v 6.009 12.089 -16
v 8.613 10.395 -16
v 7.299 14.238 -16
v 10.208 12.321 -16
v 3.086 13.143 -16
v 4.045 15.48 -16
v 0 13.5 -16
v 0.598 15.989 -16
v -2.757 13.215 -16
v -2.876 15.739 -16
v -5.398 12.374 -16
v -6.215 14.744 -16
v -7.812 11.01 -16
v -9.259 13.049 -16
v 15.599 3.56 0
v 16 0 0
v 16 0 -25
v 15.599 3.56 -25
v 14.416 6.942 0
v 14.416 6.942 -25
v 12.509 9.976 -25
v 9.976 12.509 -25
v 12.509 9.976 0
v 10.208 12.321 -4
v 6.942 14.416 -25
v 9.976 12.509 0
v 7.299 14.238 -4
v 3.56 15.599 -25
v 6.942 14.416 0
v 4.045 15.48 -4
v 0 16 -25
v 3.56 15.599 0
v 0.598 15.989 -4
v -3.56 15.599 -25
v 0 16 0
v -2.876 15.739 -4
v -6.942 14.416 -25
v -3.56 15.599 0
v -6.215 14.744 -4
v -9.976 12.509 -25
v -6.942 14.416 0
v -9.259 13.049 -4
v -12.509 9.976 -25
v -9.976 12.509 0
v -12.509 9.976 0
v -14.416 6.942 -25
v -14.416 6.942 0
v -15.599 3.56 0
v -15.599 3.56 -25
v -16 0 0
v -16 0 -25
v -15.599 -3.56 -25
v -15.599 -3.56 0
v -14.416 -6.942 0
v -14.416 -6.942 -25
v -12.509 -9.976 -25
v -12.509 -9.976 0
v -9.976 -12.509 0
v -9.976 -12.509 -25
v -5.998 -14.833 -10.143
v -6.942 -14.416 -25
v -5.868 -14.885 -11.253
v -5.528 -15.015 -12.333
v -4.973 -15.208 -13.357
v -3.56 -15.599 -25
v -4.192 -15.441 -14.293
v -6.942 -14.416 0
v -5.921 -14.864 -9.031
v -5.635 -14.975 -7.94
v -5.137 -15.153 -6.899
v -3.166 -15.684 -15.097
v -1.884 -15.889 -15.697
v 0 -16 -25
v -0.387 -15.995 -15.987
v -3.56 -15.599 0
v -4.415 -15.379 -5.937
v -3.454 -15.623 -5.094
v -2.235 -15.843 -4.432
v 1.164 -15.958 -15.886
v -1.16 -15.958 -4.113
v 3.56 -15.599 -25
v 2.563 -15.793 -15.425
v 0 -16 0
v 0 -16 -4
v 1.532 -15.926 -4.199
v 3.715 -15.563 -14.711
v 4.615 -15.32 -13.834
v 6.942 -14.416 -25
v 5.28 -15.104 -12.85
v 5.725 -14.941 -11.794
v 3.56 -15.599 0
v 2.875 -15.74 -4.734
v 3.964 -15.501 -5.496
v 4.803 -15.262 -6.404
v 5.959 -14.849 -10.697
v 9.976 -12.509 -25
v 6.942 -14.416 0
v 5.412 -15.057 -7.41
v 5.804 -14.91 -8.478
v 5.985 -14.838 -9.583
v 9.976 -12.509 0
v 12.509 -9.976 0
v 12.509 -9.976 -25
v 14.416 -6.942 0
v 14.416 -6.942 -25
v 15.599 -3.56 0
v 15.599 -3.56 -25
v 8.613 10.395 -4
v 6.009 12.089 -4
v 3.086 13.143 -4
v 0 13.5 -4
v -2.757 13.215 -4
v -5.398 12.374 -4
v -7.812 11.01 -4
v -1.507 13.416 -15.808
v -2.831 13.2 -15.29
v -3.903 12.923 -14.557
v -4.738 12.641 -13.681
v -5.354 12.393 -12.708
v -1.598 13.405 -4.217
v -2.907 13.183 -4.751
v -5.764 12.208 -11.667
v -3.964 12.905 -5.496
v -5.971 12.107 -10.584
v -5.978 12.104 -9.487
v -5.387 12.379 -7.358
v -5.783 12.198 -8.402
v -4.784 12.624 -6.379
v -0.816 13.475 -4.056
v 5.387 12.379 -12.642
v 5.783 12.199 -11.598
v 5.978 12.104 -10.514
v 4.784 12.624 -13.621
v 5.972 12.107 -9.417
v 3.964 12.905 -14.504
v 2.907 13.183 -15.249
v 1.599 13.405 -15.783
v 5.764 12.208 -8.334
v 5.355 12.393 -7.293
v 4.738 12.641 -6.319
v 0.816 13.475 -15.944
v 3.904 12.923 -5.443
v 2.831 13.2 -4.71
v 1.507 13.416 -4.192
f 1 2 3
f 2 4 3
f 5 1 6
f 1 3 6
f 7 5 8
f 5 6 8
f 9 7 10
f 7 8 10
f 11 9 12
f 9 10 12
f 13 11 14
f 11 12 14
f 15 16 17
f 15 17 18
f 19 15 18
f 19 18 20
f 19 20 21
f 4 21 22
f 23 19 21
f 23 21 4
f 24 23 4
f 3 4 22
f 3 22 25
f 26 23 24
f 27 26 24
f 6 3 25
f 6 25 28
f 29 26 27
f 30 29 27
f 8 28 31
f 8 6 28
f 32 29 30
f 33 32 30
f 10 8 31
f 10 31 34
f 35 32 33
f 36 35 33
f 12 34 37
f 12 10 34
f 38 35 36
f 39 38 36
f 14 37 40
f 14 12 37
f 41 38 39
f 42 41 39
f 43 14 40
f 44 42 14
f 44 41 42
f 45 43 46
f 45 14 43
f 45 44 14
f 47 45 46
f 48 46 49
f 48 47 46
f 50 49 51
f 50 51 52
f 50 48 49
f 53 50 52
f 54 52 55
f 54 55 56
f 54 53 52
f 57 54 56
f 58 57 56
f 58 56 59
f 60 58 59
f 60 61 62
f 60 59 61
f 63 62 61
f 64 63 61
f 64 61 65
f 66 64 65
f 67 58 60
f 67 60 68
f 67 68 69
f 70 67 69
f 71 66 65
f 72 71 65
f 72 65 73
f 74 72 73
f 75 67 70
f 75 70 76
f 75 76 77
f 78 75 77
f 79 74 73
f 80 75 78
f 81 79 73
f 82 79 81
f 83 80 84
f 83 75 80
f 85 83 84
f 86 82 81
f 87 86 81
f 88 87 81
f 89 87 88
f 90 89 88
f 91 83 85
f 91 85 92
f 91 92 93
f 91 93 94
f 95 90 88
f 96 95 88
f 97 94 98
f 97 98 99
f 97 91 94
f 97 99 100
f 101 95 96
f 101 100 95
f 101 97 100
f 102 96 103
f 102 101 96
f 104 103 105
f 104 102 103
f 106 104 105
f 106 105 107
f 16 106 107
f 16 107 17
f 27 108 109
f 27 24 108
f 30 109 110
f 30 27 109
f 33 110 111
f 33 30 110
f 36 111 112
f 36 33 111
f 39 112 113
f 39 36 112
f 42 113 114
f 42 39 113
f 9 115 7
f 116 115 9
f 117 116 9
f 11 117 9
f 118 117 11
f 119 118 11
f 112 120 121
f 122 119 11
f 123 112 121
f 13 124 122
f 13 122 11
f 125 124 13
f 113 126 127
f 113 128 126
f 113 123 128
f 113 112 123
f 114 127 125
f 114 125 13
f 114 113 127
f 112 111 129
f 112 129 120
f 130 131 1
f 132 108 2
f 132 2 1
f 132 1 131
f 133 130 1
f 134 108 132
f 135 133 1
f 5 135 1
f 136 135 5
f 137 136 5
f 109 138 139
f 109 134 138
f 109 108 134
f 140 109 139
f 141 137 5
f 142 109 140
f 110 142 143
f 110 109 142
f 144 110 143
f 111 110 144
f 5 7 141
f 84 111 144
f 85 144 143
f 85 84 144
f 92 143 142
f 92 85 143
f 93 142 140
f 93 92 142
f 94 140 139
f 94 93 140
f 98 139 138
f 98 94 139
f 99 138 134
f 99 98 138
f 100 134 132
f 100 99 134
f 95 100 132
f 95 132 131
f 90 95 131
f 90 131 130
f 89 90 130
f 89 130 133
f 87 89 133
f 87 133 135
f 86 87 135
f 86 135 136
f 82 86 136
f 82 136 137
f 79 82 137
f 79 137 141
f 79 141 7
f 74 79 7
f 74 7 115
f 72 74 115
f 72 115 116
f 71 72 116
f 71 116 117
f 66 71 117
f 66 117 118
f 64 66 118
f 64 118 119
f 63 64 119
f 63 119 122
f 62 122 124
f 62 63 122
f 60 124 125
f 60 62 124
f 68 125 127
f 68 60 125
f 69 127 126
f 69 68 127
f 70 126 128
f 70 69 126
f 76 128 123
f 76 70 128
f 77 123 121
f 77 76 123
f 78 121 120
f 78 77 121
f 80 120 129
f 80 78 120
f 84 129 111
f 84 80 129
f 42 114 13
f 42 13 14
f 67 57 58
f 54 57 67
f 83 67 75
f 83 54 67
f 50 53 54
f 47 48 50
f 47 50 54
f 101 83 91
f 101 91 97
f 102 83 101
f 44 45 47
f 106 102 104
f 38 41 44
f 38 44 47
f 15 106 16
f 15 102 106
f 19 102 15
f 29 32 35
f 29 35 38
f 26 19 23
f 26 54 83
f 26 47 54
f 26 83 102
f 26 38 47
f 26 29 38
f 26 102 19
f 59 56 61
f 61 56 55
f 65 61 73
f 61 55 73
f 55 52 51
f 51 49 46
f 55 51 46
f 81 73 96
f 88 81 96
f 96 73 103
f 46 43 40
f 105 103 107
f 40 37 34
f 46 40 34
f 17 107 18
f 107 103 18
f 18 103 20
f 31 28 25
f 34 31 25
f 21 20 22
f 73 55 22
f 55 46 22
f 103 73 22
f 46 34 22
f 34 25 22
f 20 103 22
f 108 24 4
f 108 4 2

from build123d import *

# Parameters (mm, degrees)
SKETCH1_R               = 16
BOSS_EXTRUDE1_DEPTH     = 25
CUT_EXTRUDE1_DEPTH      = 34.7194306
CUT_EXTRUDE1_DEPTH_BACK = 34.7194306
SKETCH2_R               = 6
CUT_EXTRUDE2_START      = -4
CUT_EXTRUDE2_DEPTH      = 12


with BuildPart() as part:
    # Sketch1 → Boss-Extrude1 (new body)
    with BuildSketch(Plane.XY):
        Circle(SKETCH1_R)
    extrude(amount=-BOSS_EXTRUDE1_DEPTH)

    # Sketch2 → Cut-Extrude1 (cut, two sides: drawn at the far end of the back side and taken through both)
    with BuildSketch(Plane(origin=(0, 0, 0), x_dir=(1, 0, 0), z_dir=(0, 1, 0)).offset(-CUT_EXTRUDE1_DEPTH_BACK)):
        with Locations(Location((0, 10, 0), (0, 0, 270))):
            Circle(SKETCH2_R)
    extrude(amount=CUT_EXTRUDE1_DEPTH + CUT_EXTRUDE1_DEPTH_BACK, mode=Mode.SUBTRACT)

    # Sketch3 → Cut-Extrude2 (cut)
    with BuildSketch(Plane.XY.offset(CUT_EXTRUDE2_START)):
        with BuildLine():
            Line((-7.81200483, 11.010112649), (-9.258672391, 13.049022398))
            ThreePointArc((-9.258672391, 13.049022398), (0.598342854, 15.988808143), (10.208066995, 12.320526296))
            Line((10.208066995, 12.320526296), (8.613056527, 10.395444063))
            ThreePointArc((8.613056527, 10.395444063), (0.504851783, 13.490556871), (-7.81200483, 11.010112649))
        make_face()
    extrude(amount=-CUT_EXTRUDE2_DEPTH, mode=Mode.SUBTRACT)


solid = part.part
